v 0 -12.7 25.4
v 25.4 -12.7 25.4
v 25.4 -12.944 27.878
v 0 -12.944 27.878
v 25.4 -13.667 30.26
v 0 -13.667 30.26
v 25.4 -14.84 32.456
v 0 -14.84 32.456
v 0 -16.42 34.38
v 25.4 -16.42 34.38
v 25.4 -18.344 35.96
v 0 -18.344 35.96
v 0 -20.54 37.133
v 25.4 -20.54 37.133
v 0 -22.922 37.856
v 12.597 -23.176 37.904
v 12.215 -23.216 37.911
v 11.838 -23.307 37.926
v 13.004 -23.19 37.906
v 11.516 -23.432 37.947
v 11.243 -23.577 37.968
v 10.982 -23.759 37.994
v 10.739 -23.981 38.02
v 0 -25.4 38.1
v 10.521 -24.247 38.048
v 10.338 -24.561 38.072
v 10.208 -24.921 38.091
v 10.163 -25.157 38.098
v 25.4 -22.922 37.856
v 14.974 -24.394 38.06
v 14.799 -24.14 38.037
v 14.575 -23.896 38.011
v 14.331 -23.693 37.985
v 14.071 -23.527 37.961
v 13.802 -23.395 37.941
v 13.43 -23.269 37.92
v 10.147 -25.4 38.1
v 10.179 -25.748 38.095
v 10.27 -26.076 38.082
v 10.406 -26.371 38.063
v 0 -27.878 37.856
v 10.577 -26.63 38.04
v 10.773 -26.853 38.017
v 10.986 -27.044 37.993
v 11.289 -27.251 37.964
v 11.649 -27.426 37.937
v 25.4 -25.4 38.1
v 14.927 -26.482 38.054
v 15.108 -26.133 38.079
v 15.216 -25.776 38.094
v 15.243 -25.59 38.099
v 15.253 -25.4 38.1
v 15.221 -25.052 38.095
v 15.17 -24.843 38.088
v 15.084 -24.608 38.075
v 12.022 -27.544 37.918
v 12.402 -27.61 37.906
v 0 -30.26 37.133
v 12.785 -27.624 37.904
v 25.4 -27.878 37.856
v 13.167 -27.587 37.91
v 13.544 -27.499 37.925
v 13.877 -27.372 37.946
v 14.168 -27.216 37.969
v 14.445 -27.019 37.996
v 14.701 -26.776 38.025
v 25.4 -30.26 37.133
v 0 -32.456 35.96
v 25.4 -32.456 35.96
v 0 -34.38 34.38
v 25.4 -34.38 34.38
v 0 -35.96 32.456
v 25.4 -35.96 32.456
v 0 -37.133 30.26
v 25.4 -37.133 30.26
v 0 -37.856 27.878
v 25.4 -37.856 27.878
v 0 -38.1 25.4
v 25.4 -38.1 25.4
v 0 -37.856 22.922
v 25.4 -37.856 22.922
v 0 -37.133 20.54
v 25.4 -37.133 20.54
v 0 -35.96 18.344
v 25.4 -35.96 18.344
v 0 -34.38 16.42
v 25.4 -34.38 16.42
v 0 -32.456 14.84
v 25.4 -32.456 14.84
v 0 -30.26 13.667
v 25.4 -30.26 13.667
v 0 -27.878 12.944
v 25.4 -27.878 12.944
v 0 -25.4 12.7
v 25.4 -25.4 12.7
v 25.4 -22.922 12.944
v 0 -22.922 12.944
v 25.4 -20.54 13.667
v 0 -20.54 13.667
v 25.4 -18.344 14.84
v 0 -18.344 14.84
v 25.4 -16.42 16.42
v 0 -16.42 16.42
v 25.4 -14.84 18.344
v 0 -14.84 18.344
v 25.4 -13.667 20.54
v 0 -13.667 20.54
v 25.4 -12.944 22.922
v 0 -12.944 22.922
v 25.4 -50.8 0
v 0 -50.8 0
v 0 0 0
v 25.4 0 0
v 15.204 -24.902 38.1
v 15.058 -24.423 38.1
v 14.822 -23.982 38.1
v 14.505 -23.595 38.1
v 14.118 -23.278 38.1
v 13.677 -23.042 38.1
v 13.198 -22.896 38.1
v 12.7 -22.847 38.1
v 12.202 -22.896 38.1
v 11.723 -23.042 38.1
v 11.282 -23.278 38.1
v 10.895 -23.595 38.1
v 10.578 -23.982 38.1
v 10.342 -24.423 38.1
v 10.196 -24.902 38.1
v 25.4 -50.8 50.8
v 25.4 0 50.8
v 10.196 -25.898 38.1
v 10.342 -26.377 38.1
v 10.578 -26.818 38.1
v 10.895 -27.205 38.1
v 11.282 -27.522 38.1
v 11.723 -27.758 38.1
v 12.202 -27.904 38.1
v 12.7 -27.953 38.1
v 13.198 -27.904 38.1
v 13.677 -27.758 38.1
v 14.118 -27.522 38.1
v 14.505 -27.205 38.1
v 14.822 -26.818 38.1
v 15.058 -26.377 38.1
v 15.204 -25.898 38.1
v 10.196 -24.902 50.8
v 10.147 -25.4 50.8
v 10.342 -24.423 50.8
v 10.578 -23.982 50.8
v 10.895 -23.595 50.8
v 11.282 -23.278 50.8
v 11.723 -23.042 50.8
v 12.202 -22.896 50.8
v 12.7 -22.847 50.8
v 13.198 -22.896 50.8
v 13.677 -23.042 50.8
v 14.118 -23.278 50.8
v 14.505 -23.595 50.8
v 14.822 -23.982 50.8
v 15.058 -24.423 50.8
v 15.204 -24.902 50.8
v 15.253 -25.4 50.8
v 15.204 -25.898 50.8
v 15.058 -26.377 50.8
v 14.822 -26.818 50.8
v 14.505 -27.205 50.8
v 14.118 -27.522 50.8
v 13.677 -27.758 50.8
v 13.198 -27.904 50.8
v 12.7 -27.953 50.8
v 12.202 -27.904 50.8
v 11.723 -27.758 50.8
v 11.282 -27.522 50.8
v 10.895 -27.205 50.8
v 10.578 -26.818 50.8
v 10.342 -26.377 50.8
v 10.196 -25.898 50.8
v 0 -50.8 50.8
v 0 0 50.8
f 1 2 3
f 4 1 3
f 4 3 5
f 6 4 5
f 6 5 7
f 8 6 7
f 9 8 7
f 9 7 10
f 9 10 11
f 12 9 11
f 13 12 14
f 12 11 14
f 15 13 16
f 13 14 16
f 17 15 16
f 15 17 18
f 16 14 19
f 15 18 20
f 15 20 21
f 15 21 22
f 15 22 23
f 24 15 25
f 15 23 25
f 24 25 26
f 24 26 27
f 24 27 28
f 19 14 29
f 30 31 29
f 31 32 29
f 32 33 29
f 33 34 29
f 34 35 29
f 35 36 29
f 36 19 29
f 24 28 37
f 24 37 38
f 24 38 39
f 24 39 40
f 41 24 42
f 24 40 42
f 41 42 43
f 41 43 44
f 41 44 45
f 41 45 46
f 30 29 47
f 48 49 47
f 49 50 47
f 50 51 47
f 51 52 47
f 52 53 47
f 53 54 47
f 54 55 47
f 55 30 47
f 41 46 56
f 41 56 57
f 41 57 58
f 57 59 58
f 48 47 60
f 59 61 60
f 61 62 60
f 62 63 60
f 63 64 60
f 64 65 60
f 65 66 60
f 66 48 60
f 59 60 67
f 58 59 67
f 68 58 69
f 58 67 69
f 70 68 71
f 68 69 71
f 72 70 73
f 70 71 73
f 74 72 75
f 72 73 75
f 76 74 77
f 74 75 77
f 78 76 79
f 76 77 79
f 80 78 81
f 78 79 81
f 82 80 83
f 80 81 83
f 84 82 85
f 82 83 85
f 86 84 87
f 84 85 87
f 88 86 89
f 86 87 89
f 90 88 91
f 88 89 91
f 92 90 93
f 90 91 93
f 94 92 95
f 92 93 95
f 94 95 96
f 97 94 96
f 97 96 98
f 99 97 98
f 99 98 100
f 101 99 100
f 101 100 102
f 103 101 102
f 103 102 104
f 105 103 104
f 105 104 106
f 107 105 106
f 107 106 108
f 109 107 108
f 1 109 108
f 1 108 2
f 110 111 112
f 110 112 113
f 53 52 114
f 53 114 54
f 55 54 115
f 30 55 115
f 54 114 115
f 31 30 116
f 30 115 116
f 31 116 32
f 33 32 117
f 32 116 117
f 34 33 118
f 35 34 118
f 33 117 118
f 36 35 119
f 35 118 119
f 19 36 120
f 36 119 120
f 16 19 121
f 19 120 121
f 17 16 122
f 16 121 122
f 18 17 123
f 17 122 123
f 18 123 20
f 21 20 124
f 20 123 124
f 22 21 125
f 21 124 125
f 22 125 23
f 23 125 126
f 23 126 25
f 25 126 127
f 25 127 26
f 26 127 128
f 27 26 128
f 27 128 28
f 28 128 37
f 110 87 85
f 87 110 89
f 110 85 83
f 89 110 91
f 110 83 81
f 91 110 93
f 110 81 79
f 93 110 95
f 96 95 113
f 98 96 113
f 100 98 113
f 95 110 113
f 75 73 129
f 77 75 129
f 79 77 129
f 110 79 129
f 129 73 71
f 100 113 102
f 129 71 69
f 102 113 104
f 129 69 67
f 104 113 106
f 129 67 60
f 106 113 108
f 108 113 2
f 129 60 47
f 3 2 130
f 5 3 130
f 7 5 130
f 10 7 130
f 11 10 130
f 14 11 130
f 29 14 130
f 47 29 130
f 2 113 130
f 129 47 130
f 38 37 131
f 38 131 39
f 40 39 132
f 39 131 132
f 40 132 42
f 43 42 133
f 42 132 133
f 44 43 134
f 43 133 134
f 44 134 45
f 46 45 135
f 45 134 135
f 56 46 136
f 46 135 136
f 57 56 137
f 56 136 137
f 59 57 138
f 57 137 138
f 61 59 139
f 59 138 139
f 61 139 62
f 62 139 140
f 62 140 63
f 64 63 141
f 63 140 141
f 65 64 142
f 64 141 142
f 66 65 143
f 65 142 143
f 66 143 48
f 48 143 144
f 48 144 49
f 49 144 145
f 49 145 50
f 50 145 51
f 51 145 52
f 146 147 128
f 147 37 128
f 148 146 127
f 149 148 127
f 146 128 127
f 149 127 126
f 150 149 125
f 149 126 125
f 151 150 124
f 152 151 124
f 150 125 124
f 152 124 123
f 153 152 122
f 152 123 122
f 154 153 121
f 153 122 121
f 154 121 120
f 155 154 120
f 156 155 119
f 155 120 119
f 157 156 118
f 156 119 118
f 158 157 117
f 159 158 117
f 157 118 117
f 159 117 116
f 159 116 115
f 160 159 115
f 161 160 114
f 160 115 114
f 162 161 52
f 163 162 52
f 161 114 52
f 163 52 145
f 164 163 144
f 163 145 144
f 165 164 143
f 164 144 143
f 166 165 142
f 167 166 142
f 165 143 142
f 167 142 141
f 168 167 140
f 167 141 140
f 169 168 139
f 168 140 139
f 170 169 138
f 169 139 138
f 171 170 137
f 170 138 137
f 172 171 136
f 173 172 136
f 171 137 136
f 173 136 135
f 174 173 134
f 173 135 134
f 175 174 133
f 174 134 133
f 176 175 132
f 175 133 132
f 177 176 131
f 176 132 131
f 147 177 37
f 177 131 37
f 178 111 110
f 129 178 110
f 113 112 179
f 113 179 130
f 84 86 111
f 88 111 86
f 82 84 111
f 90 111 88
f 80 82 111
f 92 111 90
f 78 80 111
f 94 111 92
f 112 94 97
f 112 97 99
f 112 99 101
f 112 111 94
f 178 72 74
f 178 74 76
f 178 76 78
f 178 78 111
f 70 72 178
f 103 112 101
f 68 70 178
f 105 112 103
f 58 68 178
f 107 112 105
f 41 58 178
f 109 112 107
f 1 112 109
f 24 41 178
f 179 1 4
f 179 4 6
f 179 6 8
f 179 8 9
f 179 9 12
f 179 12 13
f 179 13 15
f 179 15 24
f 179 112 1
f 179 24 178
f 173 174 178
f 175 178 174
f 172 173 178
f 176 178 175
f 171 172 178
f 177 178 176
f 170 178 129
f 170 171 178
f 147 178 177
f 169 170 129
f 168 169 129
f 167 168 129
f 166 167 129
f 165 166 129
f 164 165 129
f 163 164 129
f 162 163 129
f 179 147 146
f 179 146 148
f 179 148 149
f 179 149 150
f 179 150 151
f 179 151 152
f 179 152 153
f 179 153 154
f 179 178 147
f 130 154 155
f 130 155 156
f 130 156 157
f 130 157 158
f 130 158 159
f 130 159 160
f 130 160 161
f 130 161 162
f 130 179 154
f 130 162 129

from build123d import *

# Parameters (mm, degrees)
F0_W     = 25.4
F0_H     = 50.8
F1_DEPTH = 50.8
F2_R     = 12.7
F3_DEPTH = 25.401
F5_D     = 5.1054
F5_DEPTH = 12.7
F5_TIP   = 1.5338169022


with BuildPart() as f1:
    # F0 (on Front) → F1 (new body)
    with BuildSketch(Plane.XZ):
        with Locations((12.7, 25.4)):
            Rectangle(F0_W, F0_H)
    extrude(amount=F1_DEPTH)

    # F2 (on face) → F3 (cut, through all)
    with BuildSketch(Plane.YZ.offset(25.4)):
        with Locations((-25.4, 25.4)):
            Circle(F2_R)
    extrude(amount=-F3_DEPTH, mode=Mode.SUBTRACT)

    # F5
    with Locations(Plane.XY.offset(50.8)):
        with Locations((12.7, -25.4)):
            Hole(F5_D / 2, depth=F5_DEPTH)
            with Locations((0, 0, -(F5_DEPTH + F5_TIP / 2))):  # 118° drill point
                Cone(0, F5_D / 2, F5_TIP, mode=Mode.SUBTRACT)


solid = f1.part
